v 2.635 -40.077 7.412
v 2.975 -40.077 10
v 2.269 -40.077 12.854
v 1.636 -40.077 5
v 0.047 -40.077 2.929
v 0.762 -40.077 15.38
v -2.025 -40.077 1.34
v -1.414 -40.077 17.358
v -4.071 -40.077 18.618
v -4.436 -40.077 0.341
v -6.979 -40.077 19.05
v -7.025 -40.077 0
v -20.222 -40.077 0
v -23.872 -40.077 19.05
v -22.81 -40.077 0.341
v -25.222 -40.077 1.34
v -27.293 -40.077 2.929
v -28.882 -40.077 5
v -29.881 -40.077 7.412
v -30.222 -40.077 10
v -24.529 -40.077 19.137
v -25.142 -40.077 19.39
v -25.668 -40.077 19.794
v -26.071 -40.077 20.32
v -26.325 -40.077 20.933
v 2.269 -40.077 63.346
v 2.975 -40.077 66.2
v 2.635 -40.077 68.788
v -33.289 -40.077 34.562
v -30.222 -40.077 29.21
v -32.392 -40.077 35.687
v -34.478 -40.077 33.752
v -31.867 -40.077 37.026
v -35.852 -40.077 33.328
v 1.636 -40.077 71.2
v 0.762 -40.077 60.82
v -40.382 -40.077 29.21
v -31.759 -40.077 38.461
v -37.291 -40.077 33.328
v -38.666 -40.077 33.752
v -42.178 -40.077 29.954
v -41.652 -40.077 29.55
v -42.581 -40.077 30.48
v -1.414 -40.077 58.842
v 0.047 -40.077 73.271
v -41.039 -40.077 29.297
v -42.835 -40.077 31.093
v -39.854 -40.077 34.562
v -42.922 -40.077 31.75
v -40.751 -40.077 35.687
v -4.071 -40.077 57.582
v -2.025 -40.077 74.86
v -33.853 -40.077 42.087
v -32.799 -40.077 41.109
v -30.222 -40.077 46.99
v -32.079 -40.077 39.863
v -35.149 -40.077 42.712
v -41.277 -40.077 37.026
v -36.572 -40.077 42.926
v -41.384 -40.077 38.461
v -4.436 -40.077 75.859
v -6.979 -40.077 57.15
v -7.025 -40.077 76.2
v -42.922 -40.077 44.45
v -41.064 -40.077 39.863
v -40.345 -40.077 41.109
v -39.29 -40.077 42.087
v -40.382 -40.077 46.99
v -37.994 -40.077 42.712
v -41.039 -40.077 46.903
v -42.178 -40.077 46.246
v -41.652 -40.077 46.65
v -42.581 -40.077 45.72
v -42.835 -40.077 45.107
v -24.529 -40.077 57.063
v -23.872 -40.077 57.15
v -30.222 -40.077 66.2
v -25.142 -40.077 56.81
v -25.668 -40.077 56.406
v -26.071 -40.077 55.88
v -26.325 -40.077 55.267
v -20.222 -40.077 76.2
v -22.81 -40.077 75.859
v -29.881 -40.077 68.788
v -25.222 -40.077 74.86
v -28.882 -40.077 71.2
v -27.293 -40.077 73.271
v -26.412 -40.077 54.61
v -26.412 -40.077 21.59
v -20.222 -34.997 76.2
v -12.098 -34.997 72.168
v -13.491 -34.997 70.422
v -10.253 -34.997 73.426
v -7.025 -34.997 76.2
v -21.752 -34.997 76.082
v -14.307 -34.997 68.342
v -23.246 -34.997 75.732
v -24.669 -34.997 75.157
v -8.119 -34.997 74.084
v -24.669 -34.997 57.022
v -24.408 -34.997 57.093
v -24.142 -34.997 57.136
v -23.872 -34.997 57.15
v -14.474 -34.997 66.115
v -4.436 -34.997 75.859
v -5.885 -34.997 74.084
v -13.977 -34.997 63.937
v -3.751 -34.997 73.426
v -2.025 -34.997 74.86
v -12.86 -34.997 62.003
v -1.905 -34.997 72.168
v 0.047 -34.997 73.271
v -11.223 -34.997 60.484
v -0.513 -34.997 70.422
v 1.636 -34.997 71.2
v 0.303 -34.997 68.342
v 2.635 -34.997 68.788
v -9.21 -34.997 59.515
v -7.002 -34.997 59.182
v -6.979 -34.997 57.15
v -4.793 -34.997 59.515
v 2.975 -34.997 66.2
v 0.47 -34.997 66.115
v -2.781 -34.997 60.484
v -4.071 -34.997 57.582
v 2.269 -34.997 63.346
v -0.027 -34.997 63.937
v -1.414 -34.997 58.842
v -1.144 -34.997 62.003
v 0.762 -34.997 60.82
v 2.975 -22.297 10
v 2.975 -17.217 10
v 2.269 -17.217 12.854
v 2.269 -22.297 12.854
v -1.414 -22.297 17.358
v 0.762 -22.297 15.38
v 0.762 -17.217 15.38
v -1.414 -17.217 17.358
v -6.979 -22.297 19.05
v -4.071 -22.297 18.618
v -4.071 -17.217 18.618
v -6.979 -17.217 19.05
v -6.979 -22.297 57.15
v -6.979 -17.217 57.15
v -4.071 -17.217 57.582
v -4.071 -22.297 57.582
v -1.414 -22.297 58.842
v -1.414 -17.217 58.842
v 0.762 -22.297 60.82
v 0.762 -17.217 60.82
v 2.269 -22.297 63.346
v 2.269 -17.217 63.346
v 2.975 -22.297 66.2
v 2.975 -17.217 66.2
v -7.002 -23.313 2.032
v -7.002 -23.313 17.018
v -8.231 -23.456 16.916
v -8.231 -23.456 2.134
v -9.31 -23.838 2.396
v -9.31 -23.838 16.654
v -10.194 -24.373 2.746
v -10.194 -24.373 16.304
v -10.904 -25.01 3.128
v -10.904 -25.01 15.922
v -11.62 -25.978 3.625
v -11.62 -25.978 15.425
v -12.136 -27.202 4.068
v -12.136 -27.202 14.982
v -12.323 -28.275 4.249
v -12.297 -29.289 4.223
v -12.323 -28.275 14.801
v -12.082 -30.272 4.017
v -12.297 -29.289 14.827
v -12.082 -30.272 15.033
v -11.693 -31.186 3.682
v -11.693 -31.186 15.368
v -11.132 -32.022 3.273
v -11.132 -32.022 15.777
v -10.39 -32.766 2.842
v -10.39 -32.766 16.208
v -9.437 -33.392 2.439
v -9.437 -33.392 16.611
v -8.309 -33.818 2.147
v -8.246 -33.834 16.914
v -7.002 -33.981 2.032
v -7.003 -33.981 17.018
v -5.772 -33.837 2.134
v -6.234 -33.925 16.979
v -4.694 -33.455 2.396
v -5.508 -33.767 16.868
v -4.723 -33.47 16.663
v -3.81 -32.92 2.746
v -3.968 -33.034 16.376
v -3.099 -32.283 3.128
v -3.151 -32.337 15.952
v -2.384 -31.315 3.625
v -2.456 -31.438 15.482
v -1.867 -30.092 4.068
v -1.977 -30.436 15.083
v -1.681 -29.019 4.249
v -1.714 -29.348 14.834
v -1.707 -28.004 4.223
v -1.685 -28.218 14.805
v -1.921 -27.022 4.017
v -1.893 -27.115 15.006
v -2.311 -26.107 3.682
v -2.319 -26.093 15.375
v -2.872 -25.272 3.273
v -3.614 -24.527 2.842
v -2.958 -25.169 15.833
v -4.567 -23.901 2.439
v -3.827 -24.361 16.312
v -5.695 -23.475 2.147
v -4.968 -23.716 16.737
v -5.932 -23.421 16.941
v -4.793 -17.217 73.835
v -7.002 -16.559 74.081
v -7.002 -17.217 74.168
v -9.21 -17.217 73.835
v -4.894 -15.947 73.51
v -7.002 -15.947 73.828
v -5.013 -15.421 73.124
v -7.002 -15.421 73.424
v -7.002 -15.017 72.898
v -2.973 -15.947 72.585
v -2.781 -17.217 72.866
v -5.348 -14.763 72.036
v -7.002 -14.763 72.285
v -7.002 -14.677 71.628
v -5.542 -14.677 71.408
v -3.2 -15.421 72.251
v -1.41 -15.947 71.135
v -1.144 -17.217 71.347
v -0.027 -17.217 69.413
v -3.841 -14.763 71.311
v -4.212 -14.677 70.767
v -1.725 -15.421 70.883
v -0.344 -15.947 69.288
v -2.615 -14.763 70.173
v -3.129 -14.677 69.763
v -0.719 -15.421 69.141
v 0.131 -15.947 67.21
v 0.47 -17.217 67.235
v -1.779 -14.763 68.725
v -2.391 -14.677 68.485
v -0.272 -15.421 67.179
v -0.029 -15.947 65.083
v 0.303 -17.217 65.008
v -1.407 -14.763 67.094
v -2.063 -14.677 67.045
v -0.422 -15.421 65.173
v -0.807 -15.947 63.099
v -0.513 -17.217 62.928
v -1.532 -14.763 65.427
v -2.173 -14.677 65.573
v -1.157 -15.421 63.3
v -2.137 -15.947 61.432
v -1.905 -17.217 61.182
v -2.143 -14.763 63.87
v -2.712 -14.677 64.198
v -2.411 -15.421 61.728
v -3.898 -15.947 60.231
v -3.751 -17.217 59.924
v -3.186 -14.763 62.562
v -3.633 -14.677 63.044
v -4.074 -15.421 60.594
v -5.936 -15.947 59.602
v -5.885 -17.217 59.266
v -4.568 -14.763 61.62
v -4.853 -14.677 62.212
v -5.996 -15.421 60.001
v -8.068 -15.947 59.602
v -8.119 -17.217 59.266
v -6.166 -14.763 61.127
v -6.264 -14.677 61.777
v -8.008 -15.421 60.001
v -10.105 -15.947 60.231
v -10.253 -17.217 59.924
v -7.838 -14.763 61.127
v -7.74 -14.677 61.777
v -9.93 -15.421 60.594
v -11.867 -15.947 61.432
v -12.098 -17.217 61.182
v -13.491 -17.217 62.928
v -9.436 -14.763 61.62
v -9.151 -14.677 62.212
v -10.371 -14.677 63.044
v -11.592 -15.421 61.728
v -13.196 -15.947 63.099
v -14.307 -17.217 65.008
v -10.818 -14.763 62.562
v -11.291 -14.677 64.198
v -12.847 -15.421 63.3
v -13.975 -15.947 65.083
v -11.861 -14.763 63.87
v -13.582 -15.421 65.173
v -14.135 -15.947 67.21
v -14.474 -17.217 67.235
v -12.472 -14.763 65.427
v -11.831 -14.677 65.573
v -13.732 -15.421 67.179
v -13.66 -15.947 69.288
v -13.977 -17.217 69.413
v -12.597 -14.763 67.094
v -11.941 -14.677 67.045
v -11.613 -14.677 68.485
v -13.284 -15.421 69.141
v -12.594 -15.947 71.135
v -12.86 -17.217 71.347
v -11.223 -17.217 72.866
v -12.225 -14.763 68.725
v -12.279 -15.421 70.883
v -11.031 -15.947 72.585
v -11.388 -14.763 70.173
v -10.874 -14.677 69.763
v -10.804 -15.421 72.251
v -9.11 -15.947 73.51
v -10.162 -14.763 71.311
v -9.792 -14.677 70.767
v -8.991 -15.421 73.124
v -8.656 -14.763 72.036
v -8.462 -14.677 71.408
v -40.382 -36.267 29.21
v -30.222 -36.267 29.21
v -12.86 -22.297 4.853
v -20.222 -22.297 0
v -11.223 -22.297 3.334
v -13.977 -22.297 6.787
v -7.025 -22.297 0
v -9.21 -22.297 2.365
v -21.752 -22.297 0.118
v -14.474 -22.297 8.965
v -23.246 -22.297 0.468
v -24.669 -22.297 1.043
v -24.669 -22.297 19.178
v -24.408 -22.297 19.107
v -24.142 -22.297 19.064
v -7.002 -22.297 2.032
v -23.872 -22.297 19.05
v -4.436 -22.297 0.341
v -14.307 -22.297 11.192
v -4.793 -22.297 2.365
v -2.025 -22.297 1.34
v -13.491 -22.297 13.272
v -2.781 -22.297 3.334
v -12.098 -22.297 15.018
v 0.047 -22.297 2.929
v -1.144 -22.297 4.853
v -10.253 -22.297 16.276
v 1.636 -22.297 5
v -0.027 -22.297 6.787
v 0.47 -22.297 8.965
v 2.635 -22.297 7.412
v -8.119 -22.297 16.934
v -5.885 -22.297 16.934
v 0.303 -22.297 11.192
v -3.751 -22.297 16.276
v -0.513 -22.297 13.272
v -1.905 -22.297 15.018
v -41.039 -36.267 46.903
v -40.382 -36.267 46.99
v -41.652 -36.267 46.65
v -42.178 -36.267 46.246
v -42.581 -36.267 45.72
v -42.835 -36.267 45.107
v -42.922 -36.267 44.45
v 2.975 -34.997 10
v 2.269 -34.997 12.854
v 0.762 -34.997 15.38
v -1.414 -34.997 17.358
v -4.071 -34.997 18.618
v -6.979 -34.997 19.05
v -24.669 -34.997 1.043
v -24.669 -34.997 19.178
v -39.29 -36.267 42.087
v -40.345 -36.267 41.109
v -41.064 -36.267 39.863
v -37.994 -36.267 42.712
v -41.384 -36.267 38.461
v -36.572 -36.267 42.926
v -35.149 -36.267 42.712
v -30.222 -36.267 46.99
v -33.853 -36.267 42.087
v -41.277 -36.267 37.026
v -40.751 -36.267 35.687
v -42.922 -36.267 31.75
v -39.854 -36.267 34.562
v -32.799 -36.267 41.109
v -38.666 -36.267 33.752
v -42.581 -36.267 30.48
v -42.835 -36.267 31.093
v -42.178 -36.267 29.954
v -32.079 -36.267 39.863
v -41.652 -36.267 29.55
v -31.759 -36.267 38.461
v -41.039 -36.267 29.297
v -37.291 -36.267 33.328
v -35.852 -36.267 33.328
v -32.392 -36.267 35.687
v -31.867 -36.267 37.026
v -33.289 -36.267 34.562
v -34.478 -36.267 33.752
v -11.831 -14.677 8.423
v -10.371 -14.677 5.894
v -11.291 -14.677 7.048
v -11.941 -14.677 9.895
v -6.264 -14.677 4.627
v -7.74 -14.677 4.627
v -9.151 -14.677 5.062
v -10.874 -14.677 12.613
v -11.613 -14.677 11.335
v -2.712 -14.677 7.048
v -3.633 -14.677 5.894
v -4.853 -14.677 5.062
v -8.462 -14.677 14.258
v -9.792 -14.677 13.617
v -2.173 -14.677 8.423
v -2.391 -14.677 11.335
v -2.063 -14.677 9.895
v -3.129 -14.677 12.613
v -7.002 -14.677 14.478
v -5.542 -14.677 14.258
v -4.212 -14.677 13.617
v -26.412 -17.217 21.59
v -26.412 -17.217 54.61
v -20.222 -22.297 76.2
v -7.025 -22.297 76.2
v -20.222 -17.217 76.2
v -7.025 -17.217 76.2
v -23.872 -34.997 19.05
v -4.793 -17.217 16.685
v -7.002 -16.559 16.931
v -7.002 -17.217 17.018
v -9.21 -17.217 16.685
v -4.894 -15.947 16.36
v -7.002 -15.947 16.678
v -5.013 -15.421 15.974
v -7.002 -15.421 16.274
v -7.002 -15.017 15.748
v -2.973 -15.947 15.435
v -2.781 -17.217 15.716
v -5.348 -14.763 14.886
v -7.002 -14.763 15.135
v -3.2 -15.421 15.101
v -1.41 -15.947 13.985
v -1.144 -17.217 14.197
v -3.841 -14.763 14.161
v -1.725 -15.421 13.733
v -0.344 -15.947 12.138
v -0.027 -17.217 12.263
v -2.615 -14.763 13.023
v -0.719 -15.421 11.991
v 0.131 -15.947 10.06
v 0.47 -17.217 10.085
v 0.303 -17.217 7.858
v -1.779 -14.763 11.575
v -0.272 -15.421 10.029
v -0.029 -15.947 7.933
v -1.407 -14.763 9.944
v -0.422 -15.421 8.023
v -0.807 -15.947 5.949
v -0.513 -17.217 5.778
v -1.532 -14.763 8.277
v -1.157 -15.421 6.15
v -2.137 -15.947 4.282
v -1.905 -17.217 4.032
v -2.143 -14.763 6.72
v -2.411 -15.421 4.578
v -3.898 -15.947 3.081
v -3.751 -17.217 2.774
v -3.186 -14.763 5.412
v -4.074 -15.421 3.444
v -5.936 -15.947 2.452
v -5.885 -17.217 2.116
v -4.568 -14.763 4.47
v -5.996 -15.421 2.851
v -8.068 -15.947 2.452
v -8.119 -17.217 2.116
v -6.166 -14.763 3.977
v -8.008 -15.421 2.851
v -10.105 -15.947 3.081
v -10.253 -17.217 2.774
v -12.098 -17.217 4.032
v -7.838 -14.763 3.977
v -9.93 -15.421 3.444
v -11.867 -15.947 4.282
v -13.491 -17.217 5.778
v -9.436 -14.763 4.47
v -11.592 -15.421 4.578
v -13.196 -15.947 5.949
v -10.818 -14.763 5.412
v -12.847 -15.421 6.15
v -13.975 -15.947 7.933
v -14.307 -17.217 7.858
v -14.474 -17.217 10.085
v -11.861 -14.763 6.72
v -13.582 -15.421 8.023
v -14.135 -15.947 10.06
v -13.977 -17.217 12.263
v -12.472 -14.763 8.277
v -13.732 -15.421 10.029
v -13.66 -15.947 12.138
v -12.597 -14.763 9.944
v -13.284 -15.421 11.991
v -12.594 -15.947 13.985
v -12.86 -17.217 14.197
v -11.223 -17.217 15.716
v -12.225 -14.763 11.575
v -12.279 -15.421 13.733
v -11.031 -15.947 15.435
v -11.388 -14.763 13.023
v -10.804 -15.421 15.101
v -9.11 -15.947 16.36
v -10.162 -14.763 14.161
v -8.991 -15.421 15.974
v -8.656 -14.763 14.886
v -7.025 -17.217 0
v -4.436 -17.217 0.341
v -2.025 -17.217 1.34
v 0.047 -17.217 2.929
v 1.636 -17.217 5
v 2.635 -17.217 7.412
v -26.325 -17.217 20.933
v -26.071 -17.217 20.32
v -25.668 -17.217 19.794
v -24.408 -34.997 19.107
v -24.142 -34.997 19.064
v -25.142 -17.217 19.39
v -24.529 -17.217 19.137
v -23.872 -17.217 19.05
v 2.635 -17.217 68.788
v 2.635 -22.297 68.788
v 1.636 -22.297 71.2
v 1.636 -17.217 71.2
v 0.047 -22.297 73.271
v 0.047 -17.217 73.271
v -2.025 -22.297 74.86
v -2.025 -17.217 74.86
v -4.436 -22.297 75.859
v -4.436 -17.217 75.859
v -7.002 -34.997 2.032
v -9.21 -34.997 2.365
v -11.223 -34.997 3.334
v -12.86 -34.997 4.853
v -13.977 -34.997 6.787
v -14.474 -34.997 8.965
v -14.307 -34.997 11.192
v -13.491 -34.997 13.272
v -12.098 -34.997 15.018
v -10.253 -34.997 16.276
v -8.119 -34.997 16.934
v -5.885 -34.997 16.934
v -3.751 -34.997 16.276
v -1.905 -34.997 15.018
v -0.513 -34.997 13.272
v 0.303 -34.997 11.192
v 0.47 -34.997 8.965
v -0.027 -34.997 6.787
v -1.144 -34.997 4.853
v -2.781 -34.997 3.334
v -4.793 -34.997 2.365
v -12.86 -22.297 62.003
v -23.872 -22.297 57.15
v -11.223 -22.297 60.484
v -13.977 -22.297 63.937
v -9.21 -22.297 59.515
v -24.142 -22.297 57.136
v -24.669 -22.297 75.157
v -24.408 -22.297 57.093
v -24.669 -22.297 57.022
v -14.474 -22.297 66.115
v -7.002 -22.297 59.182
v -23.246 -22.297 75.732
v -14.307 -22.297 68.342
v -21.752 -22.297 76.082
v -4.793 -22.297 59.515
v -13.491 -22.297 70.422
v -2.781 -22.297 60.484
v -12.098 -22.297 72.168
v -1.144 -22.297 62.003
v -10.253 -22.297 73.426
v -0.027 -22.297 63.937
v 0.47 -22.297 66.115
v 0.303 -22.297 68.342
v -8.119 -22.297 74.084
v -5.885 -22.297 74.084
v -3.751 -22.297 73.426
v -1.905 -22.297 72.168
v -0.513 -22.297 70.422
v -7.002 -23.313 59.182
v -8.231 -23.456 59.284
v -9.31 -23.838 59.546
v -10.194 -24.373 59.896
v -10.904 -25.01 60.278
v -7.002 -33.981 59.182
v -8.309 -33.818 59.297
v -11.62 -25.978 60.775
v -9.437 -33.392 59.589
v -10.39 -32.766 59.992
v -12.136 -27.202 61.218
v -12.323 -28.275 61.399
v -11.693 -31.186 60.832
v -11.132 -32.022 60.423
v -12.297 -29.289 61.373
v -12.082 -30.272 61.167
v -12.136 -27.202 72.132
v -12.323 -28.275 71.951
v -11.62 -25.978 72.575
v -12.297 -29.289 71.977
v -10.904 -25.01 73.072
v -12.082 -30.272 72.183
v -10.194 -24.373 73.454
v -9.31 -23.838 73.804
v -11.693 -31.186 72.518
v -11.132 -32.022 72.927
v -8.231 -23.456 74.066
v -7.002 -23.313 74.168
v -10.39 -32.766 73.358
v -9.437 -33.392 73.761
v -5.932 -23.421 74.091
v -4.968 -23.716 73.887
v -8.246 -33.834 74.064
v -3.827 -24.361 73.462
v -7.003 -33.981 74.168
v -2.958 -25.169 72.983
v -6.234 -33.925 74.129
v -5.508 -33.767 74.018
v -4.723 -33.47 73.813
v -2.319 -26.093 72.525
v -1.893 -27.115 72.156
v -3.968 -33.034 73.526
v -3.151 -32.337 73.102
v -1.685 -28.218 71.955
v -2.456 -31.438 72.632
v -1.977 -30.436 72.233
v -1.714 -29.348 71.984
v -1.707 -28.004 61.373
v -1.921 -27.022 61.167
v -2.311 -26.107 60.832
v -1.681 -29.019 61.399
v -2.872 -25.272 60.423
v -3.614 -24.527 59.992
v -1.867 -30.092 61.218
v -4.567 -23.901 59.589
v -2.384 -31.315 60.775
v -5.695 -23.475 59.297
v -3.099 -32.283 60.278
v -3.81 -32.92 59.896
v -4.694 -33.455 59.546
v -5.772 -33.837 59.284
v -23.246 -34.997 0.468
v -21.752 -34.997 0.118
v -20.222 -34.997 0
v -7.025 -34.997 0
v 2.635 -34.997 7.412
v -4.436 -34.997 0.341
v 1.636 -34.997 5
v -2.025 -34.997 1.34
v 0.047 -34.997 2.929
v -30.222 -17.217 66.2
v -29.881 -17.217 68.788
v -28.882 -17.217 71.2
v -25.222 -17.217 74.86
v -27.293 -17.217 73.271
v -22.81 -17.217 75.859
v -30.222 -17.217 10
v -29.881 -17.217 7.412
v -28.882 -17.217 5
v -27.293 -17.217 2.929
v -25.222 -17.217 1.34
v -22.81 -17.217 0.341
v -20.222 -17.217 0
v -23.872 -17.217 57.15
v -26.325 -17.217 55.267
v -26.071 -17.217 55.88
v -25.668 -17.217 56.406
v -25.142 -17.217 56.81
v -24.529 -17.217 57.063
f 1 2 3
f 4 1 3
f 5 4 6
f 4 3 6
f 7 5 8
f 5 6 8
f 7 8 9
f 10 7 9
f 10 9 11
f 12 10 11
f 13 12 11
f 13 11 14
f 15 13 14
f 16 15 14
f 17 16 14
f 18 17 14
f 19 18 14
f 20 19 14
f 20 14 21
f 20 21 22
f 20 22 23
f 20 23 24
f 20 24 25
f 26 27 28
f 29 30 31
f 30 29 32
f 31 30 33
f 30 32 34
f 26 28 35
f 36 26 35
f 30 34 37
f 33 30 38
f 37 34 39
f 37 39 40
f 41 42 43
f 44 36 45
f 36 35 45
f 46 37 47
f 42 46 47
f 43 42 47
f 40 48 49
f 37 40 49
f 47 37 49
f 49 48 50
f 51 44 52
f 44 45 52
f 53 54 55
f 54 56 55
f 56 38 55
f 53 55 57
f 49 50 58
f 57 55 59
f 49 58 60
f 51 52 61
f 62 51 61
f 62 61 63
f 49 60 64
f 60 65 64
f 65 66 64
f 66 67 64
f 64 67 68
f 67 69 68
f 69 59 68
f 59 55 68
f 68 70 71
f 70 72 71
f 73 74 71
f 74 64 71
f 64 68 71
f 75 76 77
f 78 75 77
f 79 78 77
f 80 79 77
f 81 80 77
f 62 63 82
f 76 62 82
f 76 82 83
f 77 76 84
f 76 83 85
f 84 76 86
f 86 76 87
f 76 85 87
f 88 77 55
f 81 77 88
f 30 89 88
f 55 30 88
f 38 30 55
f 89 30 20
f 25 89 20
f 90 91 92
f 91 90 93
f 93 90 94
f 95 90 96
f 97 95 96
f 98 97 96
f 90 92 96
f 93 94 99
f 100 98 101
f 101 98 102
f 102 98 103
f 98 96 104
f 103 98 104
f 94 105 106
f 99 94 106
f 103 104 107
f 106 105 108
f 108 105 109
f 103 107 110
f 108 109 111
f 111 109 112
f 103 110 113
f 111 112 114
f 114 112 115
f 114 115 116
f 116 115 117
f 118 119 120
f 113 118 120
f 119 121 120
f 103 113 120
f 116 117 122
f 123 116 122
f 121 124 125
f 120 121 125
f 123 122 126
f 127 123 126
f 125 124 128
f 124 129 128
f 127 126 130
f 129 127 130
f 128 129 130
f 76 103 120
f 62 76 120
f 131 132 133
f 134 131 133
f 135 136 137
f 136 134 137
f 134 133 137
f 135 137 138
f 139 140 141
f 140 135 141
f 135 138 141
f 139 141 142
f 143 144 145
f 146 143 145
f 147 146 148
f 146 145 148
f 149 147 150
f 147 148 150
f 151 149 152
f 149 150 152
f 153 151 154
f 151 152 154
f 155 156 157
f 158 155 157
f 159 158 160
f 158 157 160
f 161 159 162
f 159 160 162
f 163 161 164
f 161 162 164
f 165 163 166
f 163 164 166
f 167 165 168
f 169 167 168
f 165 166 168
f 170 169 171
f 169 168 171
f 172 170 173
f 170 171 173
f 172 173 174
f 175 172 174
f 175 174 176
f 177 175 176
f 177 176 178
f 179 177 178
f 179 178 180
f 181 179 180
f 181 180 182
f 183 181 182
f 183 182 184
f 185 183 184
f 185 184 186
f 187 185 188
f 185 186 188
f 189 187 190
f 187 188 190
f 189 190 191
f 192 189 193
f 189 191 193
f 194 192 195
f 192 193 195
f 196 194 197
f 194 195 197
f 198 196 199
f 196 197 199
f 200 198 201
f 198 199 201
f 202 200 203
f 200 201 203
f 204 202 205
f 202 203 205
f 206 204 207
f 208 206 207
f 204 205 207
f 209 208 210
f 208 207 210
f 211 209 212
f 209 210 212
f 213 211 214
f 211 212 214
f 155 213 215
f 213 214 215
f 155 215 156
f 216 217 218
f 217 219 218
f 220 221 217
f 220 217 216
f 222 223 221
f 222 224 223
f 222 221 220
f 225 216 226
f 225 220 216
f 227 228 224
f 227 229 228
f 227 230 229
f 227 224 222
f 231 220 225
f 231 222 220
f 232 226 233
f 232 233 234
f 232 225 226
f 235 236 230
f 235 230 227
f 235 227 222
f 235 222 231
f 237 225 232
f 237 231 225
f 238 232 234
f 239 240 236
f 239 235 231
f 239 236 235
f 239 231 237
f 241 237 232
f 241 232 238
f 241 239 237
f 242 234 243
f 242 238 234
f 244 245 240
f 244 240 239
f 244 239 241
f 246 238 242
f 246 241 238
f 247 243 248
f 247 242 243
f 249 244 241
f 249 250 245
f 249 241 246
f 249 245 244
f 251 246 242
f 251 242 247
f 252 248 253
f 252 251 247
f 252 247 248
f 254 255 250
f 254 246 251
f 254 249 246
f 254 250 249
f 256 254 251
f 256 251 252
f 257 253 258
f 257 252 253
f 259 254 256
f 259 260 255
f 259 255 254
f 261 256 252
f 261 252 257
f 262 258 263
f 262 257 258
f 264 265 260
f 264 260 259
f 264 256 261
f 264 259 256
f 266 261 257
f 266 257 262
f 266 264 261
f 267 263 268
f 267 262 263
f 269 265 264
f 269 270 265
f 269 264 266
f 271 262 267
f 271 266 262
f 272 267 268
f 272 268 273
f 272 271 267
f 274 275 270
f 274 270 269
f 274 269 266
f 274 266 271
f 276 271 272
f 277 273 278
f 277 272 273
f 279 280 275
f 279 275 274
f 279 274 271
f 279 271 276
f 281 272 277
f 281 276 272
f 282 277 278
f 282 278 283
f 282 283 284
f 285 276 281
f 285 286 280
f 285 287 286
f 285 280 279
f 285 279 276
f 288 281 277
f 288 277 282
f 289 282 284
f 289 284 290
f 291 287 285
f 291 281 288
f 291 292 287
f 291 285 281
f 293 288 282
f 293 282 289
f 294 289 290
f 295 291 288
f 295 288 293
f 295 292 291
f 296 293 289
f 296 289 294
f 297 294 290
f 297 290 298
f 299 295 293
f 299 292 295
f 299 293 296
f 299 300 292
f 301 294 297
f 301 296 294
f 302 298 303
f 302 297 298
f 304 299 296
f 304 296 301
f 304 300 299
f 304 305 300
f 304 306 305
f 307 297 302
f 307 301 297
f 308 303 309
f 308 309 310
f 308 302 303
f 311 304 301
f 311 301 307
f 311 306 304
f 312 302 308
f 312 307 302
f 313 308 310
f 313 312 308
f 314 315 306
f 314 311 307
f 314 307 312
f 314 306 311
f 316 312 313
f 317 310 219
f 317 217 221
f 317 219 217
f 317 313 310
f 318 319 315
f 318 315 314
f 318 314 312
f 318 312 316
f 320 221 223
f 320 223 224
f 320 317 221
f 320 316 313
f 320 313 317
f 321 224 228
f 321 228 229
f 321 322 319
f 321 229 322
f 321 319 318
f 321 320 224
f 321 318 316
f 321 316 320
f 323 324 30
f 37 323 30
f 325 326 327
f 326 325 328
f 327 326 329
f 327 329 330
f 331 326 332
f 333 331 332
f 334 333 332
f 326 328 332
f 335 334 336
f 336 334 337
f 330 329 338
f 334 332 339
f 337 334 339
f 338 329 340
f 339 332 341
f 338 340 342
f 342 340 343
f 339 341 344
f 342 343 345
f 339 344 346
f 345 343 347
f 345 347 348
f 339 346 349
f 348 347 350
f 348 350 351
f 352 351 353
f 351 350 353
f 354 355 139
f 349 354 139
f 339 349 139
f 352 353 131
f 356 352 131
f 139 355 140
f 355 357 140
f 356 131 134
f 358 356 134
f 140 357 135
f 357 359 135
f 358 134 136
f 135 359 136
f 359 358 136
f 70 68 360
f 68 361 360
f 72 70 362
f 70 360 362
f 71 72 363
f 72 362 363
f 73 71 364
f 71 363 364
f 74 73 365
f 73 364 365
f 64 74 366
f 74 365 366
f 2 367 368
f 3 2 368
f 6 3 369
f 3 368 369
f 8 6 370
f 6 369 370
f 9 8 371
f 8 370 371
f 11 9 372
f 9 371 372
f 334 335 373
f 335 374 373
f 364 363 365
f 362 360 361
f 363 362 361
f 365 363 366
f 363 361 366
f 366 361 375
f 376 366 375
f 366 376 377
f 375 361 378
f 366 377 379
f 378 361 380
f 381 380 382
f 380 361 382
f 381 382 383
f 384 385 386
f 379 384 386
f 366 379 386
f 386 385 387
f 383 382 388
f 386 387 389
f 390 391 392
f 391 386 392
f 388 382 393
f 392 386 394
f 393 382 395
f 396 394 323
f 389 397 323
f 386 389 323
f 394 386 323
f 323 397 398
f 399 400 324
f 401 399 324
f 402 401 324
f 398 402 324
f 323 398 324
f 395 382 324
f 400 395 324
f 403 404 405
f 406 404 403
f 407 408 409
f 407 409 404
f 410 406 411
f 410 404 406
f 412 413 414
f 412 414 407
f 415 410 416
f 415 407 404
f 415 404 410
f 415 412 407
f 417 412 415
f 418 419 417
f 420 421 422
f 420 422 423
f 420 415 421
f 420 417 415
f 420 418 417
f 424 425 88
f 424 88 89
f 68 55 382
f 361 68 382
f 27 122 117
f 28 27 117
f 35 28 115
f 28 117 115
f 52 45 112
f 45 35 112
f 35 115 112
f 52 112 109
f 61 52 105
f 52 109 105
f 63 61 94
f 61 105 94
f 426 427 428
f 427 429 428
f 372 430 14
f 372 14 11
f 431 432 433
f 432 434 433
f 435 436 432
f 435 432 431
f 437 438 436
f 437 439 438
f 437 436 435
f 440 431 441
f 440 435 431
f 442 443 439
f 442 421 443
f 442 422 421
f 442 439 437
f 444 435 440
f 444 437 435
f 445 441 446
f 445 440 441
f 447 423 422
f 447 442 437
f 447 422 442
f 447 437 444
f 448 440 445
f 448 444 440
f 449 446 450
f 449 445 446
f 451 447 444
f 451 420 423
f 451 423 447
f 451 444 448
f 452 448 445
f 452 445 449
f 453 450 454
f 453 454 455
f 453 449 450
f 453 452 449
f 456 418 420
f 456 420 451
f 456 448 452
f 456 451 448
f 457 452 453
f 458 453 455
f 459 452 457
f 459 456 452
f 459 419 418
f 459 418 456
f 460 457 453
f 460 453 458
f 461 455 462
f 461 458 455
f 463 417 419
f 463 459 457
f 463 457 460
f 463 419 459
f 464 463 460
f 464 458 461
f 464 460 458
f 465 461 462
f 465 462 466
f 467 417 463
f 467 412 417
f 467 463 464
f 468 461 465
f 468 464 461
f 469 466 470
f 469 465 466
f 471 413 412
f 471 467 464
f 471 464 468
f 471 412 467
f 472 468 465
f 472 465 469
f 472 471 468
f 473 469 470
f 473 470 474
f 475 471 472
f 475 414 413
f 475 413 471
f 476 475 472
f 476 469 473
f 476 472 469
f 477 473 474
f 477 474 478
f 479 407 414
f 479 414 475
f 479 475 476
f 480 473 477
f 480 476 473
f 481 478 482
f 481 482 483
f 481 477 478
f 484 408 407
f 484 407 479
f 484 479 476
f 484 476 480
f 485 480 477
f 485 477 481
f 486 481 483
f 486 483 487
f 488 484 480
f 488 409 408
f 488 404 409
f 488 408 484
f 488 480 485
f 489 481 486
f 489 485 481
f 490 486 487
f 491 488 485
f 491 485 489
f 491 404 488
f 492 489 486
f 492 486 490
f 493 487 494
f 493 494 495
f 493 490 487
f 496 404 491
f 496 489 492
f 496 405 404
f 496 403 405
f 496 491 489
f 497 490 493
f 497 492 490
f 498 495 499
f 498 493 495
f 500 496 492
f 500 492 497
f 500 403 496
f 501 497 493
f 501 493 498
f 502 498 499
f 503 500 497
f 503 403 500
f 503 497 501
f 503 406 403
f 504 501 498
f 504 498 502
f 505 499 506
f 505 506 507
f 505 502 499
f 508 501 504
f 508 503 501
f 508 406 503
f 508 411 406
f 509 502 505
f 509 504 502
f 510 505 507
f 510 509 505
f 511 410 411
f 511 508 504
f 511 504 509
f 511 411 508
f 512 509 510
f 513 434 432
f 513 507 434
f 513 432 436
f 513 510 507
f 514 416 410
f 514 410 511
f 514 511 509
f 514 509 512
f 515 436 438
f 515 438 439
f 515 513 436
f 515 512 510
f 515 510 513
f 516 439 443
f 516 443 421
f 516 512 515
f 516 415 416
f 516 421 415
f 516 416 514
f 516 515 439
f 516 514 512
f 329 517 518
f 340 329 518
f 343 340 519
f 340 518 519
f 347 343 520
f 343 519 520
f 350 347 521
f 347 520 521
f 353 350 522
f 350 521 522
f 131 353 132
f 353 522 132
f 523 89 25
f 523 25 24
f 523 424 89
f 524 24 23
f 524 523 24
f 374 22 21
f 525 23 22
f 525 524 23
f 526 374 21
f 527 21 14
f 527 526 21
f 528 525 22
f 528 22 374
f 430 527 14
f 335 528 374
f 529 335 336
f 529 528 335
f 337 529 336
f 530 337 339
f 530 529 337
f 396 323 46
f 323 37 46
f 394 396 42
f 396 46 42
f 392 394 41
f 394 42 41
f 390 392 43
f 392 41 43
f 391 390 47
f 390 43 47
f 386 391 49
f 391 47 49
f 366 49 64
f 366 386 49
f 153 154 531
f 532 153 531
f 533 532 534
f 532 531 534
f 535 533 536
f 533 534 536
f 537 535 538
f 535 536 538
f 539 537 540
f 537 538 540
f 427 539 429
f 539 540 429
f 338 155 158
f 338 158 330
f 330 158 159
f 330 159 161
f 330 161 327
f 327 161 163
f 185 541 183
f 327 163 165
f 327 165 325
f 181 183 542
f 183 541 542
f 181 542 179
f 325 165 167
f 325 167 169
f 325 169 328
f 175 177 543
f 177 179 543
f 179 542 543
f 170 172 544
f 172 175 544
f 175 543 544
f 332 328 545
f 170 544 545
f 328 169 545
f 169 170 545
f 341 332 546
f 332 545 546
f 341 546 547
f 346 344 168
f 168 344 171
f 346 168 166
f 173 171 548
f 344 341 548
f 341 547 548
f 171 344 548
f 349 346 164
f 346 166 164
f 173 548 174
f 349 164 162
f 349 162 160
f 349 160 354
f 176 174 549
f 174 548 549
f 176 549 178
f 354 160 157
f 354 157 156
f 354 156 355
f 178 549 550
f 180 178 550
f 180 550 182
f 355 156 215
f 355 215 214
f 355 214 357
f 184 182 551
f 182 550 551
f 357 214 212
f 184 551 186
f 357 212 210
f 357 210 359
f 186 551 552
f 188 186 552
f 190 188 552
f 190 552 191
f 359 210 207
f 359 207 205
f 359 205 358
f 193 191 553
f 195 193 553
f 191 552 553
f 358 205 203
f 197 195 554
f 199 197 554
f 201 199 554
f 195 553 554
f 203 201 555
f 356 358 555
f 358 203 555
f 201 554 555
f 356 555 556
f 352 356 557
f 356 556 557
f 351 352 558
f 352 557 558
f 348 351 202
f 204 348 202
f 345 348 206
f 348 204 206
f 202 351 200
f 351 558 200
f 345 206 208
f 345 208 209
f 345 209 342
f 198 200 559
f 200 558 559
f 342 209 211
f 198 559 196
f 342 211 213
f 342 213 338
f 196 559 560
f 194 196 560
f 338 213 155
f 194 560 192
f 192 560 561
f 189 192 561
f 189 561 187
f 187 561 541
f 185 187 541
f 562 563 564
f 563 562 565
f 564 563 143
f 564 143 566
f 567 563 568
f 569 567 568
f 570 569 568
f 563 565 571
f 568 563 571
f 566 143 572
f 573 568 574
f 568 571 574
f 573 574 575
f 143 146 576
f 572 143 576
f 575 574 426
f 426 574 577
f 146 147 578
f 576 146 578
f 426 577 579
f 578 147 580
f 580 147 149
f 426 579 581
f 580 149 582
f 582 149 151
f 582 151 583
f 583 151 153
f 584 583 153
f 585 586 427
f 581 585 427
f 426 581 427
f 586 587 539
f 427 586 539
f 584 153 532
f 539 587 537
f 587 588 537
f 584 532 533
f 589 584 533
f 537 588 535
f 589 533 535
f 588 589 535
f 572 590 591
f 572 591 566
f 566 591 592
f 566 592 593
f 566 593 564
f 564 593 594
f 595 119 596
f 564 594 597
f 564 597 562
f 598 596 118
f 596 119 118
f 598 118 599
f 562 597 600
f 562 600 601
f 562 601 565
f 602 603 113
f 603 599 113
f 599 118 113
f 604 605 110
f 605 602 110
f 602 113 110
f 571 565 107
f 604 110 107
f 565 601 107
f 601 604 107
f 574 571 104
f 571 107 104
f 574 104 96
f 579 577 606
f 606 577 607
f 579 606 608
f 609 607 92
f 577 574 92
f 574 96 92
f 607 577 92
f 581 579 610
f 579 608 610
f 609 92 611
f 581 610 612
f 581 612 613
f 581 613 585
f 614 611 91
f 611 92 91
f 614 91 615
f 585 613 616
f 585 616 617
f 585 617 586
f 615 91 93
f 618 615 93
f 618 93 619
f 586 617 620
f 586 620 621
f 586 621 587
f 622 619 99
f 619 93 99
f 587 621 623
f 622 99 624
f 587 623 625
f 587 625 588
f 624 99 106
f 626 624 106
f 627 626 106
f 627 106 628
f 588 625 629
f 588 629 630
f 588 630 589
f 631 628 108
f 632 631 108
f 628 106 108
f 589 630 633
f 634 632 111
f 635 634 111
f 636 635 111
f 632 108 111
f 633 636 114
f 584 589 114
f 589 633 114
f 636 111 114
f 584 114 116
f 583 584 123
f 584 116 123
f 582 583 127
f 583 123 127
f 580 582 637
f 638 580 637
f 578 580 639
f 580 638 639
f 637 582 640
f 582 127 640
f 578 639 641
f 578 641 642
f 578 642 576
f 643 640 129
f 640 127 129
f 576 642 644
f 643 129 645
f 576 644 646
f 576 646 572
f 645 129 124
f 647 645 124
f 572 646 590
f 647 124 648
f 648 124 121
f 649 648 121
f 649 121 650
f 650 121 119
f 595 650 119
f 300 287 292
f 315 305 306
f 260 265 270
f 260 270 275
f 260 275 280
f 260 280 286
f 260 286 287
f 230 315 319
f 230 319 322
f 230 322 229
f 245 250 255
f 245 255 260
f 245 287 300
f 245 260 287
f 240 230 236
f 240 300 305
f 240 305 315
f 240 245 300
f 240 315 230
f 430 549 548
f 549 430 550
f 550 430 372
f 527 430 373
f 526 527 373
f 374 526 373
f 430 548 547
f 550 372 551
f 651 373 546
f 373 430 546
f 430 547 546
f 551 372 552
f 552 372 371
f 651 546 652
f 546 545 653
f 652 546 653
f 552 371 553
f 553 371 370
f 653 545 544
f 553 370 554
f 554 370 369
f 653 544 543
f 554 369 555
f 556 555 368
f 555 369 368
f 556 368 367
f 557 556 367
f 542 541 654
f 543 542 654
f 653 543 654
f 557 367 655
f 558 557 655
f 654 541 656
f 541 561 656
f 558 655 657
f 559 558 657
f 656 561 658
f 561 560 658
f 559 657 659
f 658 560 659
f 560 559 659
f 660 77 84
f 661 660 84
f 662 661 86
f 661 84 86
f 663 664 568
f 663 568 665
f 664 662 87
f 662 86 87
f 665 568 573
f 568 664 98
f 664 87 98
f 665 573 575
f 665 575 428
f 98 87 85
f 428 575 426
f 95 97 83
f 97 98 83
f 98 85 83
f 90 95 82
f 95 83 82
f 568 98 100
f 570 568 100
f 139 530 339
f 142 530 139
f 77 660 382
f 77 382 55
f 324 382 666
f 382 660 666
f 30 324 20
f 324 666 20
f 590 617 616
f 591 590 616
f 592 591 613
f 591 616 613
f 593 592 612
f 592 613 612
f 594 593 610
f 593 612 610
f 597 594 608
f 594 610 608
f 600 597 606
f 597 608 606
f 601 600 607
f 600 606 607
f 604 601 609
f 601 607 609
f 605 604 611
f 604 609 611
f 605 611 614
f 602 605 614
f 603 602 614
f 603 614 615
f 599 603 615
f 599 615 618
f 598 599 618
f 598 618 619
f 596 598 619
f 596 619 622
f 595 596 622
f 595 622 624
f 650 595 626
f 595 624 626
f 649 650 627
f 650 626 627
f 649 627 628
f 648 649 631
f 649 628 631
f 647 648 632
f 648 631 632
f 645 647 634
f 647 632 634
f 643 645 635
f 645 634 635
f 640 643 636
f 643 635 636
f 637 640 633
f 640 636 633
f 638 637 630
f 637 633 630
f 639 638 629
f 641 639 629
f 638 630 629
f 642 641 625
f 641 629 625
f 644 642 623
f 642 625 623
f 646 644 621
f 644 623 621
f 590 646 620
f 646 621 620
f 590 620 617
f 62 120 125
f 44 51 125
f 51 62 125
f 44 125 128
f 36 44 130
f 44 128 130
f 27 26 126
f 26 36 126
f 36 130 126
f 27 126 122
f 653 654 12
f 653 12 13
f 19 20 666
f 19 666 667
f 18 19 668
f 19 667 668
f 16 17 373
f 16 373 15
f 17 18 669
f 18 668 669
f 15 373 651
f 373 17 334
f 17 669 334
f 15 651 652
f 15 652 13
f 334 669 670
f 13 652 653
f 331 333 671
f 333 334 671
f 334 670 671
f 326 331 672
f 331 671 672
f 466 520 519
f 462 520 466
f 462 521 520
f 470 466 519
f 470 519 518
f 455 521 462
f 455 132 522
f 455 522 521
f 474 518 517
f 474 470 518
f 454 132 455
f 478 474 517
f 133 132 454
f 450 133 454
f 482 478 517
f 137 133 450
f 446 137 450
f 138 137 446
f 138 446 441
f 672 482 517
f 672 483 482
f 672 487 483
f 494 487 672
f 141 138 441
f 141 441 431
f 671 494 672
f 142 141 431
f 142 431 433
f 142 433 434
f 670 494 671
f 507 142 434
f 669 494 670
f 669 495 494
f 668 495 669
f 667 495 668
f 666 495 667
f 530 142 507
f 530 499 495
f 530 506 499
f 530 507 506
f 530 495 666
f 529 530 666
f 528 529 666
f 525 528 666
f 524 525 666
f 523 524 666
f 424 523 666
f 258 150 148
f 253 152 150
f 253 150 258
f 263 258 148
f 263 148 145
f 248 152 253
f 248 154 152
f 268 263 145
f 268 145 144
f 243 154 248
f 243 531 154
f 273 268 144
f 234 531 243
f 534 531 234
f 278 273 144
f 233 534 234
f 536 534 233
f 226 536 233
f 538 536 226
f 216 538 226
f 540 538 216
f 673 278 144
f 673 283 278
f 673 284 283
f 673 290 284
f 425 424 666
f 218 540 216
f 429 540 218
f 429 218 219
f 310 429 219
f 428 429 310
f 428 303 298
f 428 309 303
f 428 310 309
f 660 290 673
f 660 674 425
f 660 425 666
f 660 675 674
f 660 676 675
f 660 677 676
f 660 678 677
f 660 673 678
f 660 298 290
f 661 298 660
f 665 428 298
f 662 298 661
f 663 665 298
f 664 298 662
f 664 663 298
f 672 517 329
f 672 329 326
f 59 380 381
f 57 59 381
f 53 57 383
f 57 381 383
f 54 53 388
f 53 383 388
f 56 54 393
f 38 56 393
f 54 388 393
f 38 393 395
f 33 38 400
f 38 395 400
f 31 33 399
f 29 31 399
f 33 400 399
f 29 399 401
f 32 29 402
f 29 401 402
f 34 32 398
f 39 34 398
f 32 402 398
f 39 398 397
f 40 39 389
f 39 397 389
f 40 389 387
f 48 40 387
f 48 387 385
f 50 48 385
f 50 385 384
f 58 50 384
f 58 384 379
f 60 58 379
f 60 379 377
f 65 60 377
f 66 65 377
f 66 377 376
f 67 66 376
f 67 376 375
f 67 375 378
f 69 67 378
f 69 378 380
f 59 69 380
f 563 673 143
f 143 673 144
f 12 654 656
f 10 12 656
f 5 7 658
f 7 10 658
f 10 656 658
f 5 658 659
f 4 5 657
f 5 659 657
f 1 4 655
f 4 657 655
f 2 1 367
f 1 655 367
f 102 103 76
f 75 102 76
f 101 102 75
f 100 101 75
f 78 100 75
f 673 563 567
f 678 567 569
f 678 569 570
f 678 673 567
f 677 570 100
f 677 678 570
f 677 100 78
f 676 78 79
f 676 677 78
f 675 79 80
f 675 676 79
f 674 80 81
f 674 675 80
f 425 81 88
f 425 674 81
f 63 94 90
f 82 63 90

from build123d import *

# Parameters (mm, degrees)
BOSS_EXTRUDE4_DEPTH = 76.2
FILLET1_R           = 10
SKETCH8_W           = 29.387209302
SKETCH8_H           = 38.1
CUT_EXTRUDE2_DEPTH  = 25.4
FILLET2_R           = 10
SKETCH9_R           = 7.493
BOSS_EXTRUDE5_DEPTH = 2.54
FILLET4_R           = 2.54
BOSS_EXTRUDE6_REACH = 86.455
SKETCH10_R          = 7.493
SKETCH11_R          = 5.334
CUT_EXTRUDE3_DEPTH  = 76.2
FILLET5_R           = 2.54
BOSS_EXTRUDE7_DEPTH = 12.7
FILLET6_R           = 2.54
SKETCH13_R          = 4.826
CUT_EXTRUDE4_DEPTH  = 5.08


# Some blends are built 0.0001 mm under size
with BuildPart() as part:
    # Sketch7 → Boss-Extrude4 (new body)
    with BuildSketch(Plane.XY):
        Polygon((-30.221718637, -17.216733289), (2.975490665, -17.216733289), (2.975490665, -22.296733289), (-24.669160498, -22.296733289), (-24.669160498, -34.996733289), (2.975490665, -34.996733289), (2.975490665, -40.076733289), (-30.221718637, -40.076733289), (-30.221718637, -34.996733289), (-30.221718637, -22.296733289), align=None)
    extrude(amount=BOSS_EXTRUDE4_DEPTH)

    # Fillet1
    # the kernel refuses this fillet: 10 mm, written as the material it takes off along each edge
    with BuildSketch(Plane(origin=(-30.221718637, -65.076733289, 76.2), x_dir=(1, 0, 0), z_dir=(0, 1, 0)), Plane(origin=(-30.221718637, 7.783266711, 0), x_dir=(1, 0, 0), z_dir=(0, -1, 0))) as fillet1_piece_1:
        with BuildLine():
            CenterArc((FILLET1_R, FILLET1_R), FILLET1_R, 180, 90)
            Line((0, FILLET1_R), (0, 0))
            Line((0, 0), (FILLET1_R, 0))
        make_face()
    extrude(amount=72.86, mode=Mode.SUBTRACT)
    with BuildSketch(Plane(origin=(2.975490665, -9.996733289, 76.2), x_dir=(-1, 0, 0), z_dir=(0, -1, 0)), Plane(origin=(2.975490665, 7.783266711, 76.2), x_dir=(-1, 0, 0), z_dir=(0, -1, 0)), Plane(origin=(2.975490665, -9.996733289, 0), x_dir=(0, 0, 1), z_dir=(0, -1, 0))) as fillet1_piece_2:
        with BuildLine():
            CenterArc((FILLET1_R, FILLET1_R), FILLET1_R, 180, 90)
            Line((0, FILLET1_R), (0, 0))
            Line((0, 0), (FILLET1_R, 0))
        make_face()
    extrude(amount=55.08, mode=Mode.SUBTRACT)
    with BuildSketch(Plane(origin=(2.975490665, 7.783266711, 0), x_dir=(-1, 0, 0), z_dir=(0, -1, 0))) as fillet1_piece_3:
        with BuildLine():
            CenterArc((FILLET1_R, -FILLET1_R), FILLET1_R, 90, 90)
            Line((0, -FILLET1_R), (0, 0))
            Line((0, 0), (FILLET1_R, 0))
        make_face()
    extrude(amount=55.08, mode=Mode.SUBTRACT)

    # Sketch8 → Cut-Extrude2 (cut)
    with BuildSketch(Plane(origin=(0, -17.216733289, 0), x_dir=(1, 0, 0), z_dir=(0, 1, 0))):
        with Locations((-11.718113986, -38.1)):
            Rectangle(SKETCH8_W, SKETCH8_H)
    extrude(amount=-CUT_EXTRUDE2_DEPTH, mode=Mode.SUBTRACT)

    # Fillet2
    # the kernel refuses this fillet: 10 mm, written as the material it takes off along each edge
    with BuildSketch(Plane(origin=(2.975490665, -10.109801477, 57.15), x_dir=(-1, 0, 0), z_dir=(0, -1, 0)), Plane(origin=(2.975490665, 7.670198523, 57.15), x_dir=(-1, 0, 0), z_dir=(0, -1, 0))) as fillet2_piece_1:
        with BuildLine():
            CenterArc((9.954772725, -10), FILLET2_R, 90, 84.548680188)
            Line((0, -9.05), (-0.199095454, -9.031))
            ThreePointArc((-0.199095454, -9.031), (-0.2, -4.525), (-0.2, 0))
            Line((-0.2, 0), (0, 0.2))
            Line((0, 0.2), (9.954772725, 0.2))
            Line((9.954772725, 0.2), (9.954772725, 0))
        make_face()
    extrude(amount=54.853863623, mode=Mode.SUBTRACT)
    with BuildSketch(Plane(origin=(2.975490665, -10.109801477, 19.05), x_dir=(-1, 0, 0), z_dir=(0, -1, 0))) as fillet2_piece_2:
        with BuildLine():
            CenterArc((9.954772725, 10), FILLET2_R, 185.451319812, 84.548680188)
            Line((0, 9.05), (-0.199095454, 9.031))
            ThreePointArc((-0.199095454, 9.031), (-0.2, 4.525), (-0.2, 0))
            Line((-0.2, 0), (0, -0.2))
            Line((0, -0.2), (9.954772725, -0.2))
            Line((9.954772725, -0.2), (9.954772725, 0))
        make_face()
    extrude(amount=54.853863623, mode=Mode.SUBTRACT)
    with BuildSketch(Plane(origin=(2.975490665, 7.670198523, 19.05), x_dir=(0, 0, -1), z_dir=(0, -1, 0))) as fillet2_piece_3:
        with BuildLine():
            CenterArc((10, -9.954772725), FILLET2_R, 95.451319812, 84.548680188)
            Line((0, -9.954772725), (-0.2, -9.954772725))
            Line((-0.2, -9.954772725), (-0.2, 0))
            Line((-0.2, 0), (0, 0.2))
            ThreePointArc((0, 0.2), (4.525, 0.2), (9.031, 0.199095454))
            Line((9.031, 0.199095454), (9.05, 0))
        make_face()
    extrude(amount=54.853863623, mode=Mode.SUBTRACT)

    # Sketch9 → Boss-Extrude5 (add)
    with BuildSketch(Plane(origin=(0, -17.216733289, 0), x_dir=(1, 0, 0), z_dir=(0, 1, 0))):
        with Locations(Location((-7.001895697, -66.675, 0), (0, 0, 270))):
            Circle(SKETCH9_R)
        with Locations(Location((-7.001895697, -9.525, 0), (0, 0, 270))):
            Circle(SKETCH9_R)
    extrude(amount=BOSS_EXTRUDE5_DEPTH)

    # Fillet4
    fillet4_edges = [part.edges().sort_by_distance(p)[0] for p in [
        (-7.001895697, -14.676733289, 59.182),
        (-7.001895697, -14.676733289, 2.032),
    ]]
    fillet(fillet4_edges, radius=FILLET4_R - 0.0001)  # a hair under: the kernel refuses the full size

    # Sketch10 → Boss-Extrude6 (add, up to next)
    with BuildSketch(Plane(origin=(0, -34.996733289, 0), x_dir=(1, 0, 0), z_dir=(0, 1, 0)), mode=Mode.PRIVATE) as boss_extrude6_sk1:
        with Locations(Location((-7.001895697, -66.675, 0), (0, 0, 90))):
            Circle(SKETCH10_R)
    boss_extrude6_tool1 = extrude(boss_extrude6_sk1.sketch, amount=BOSS_EXTRUDE6_REACH, mode=Mode.PRIVATE) - part.part
    # Sketch10 → Boss-Extrude6 (add, up to next)
    with BuildSketch(Plane(origin=(0, -34.996733289, 0), x_dir=(1, 0, 0), z_dir=(0, 1, 0)), mode=Mode.PRIVATE) as boss_extrude6_sk2:
        with Locations(Location((-7.001895697, -9.525, 0), (0, 0, 90))):
            Circle(SKETCH10_R)
    boss_extrude6_tool2 = extrude(boss_extrude6_sk2.sketch, amount=BOSS_EXTRUDE6_REACH, mode=Mode.PRIVATE) - part.part
    add(boss_extrude6_tool1.solids().sort_by_distance((-7.001896, -34.996733, 66.675))[0])
    add(boss_extrude6_tool2.solids().sort_by_distance((-7.001896, -34.996733, 9.525))[0])

    # Sketch11 → Cut-Extrude3 (cut)
    with BuildSketch(Plane.XY.offset(76.2)):
        with Locations(Location((-7.001895697, -28.646733289, 0), (0, 0, 90.00000003))):
            Circle(SKETCH11_R)
    extrude(amount=-CUT_EXTRUDE3_DEPTH, mode=Mode.SUBTRACT)

    # Fillet5
    # the kernel refuses this fillet: 2.54 mm, written as the material it adds along each edge
    with BuildSketch(Plane(origin=(-26.411718637, -17.216733289, 57.15), x_dir=(0, 0, -1), z_dir=(0, -1, 0))) as fillet5_piece_1_section:
        with BuildLine():
            CenterArc((FILLET5_R, FILLET5_R), FILLET5_R, 180, 90)
            Line((0, FILLET5_R), (0, 0))
            Line((0, 0), (FILLET5_R, 0))
        make_face()
    fillet5_piece_1 = extrude(amount=22.86, mode=Mode.PRIVATE)
    fillet5_piece_1 = split(fillet5_piece_1, bisect_by=Plane(origin=(-24.669160498, -17.216733289, 57.15), z_dir=(-1, 0, 0)), keep=Keep.TOP, mode=Mode.PRIVATE)
    fillet5_piece_1 = split(fillet5_piece_1, bisect_by=Plane(origin=(-26.411718637, -22.296733289, 57.15), z_dir=(0, 1, 0)), keep=Keep.TOP, mode=Mode.PRIVATE)
    add(fillet5_piece_1)
    with BuildSketch(Plane(origin=(-26.411718637, -17.216733289, 57.15), x_dir=(0, 0, -1), z_dir=(0, -1, 0))) as fillet5_piece_2_section:
        with BuildLine():
            CenterArc((FILLET5_R, FILLET5_R), FILLET5_R, 180, 90)
            Line((0, FILLET5_R), (0, 0))
            Line((0, 0), (FILLET5_R, 0))
        make_face()
    fillet5_piece_2 = extrude(amount=22.86, mode=Mode.PRIVATE)
    fillet5_piece_2 = split(fillet5_piece_2, bisect_by=Plane(origin=(-24.669160498, -17.216733289, 57.15), z_dir=(1, 0, 0)), keep=Keep.TOP, mode=Mode.PRIVATE)
    fillet5_piece_2 = split(fillet5_piece_2, bisect_by=Plane(origin=(-26.411718637, -22.296733289, 57.15), z_dir=(0, 1, 0)), keep=Keep.TOP, mode=Mode.PRIVATE)
    add(fillet5_piece_2)
    with BuildSketch(Plane(origin=(-26.411718637, -17.216733289, 57.15), x_dir=(0, 0, -1), z_dir=(0, -1, 0))) as fillet5_piece_3_section:
        with BuildLine():
            CenterArc((FILLET5_R, FILLET5_R), FILLET5_R, 180, 90)
            Line((0, FILLET5_R), (0, 0))
            Line((0, 0), (FILLET5_R, 0))
        make_face()
    fillet5_piece_3 = extrude(amount=22.86, mode=Mode.PRIVATE)
    fillet5_piece_3 = split(fillet5_piece_3, bisect_by=Plane(origin=(-26.411718637, -34.996733289, 57.15), z_dir=(0, 1, 0)), keep=Keep.TOP, mode=Mode.PRIVATE)
    fillet5_piece_3 = split(fillet5_piece_3, bisect_by=Plane(origin=(-24.669160498, -17.216733289, 57.15), z_dir=(-1, 0, 0)), keep=Keep.TOP, mode=Mode.PRIVATE)
    fillet5_piece_3 = split(fillet5_piece_3, bisect_by=Plane(origin=(-26.411718637, -22.296733289, 57.15), z_dir=(0, -1, 0)), keep=Keep.TOP, mode=Mode.PRIVATE)
    add(fillet5_piece_3)
    with BuildSketch(Plane(origin=(-26.411718637, -17.216733289, 57.15), x_dir=(0, 0, -1), z_dir=(0, -1, 0))) as fillet5_piece_4_section:
        with BuildLine():
            CenterArc((FILLET5_R, FILLET5_R), FILLET5_R, 180, 90)
            Line((0, FILLET5_R), (0, 0))
            Line((0, 0), (FILLET5_R, 0))
        make_face()
    fillet5_piece_4 = extrude(amount=22.86, mode=Mode.PRIVATE)
    fillet5_piece_4 = split(fillet5_piece_4, bisect_by=Plane(origin=(-26.411718637, -34.996733289, 57.15), z_dir=(0, -1, 0)), keep=Keep.TOP, mode=Mode.PRIVATE)
    fillet5_piece_4 = split(fillet5_piece_4, bisect_by=Plane(origin=(-24.669160498, -17.216733289, 57.15), z_dir=(-1, 0, 0)), keep=Keep.TOP, mode=Mode.PRIVATE)
    add(fillet5_piece_4)
    with BuildSketch(Plane(origin=(-26.411718637, -17.216733289, 57.15), x_dir=(0, 0, -1), z_dir=(0, -1, 0))) as fillet5_piece_5_section:
        with BuildLine():
            CenterArc((FILLET5_R, FILLET5_R), FILLET5_R, 180, 90)
            Line((0, FILLET5_R), (0, 0))
            Line((0, 0), (FILLET5_R, 0))
        make_face()
    fillet5_piece_5 = extrude(amount=22.86, mode=Mode.PRIVATE)
    fillet5_piece_5 = split(fillet5_piece_5, bisect_by=Plane(origin=(-26.411718637, -34.996733289, 57.15), z_dir=(0, -1, 0)), keep=Keep.TOP, mode=Mode.PRIVATE)
    fillet5_piece_5 = split(fillet5_piece_5, bisect_by=Plane(origin=(-24.669160498, -17.216733289, 57.15), z_dir=(1, 0, 0)), keep=Keep.TOP, mode=Mode.PRIVATE)
    add(fillet5_piece_5)
    with BuildSketch(Plane(origin=(-26.411718637, -17.216733289, 19.05), x_dir=(1, 0, 0), z_dir=(0, -1, 0))) as fillet5_piece_6_section:
        with BuildLine():
            CenterArc((FILLET5_R, FILLET5_R), FILLET5_R, 180, 90)
            Line((0, FILLET5_R), (0, 0))
            Line((0, 0), (FILLET5_R, 0))
        make_face()
    fillet5_piece_6 = extrude(amount=22.86, mode=Mode.PRIVATE)
    fillet5_piece_6 = split(fillet5_piece_6, bisect_by=Plane(origin=(-26.411718637, -22.296733289, 19.05), z_dir=(0, 1, 0)), keep=Keep.TOP, mode=Mode.PRIVATE)
    fillet5_piece_6 = split(fillet5_piece_6, bisect_by=Plane(origin=(-24.669160498, -17.216733289, 19.05), z_dir=(1, 0, 0)), keep=Keep.TOP, mode=Mode.PRIVATE)
    add(fillet5_piece_6)
    with BuildSketch(Plane(origin=(-26.411718637, -17.216733289, 19.05), x_dir=(1, 0, 0), z_dir=(0, -1, 0))) as fillet5_piece_7_section:
        with BuildLine():
            CenterArc((FILLET5_R, FILLET5_R), FILLET5_R, 180, 90)
            Line((0, FILLET5_R), (0, 0))
            Line((0, 0), (FILLET5_R, 0))
        make_face()
    fillet5_piece_7 = extrude(amount=22.86, mode=Mode.PRIVATE)
    fillet5_piece_7 = split(fillet5_piece_7, bisect_by=Plane(origin=(-26.411718637, -22.296733289, 19.05), z_dir=(0, 1, 0)), keep=Keep.TOP, mode=Mode.PRIVATE)
    fillet5_piece_7 = split(fillet5_piece_7, bisect_by=Plane(origin=(-24.669160498, -17.216733289, 19.05), z_dir=(-1, 0, 0)), keep=Keep.TOP, mode=Mode.PRIVATE)
    add(fillet5_piece_7)
    with BuildSketch(Plane(origin=(-26.411718637, -17.216733289, 19.05), x_dir=(1, 0, 0), z_dir=(0, -1, 0))) as fillet5_piece_8_section:
        with BuildLine():
            CenterArc((FILLET5_R, FILLET5_R), FILLET5_R, 180, 90)
            Line((0, FILLET5_R), (0, 0))
            Line((0, 0), (FILLET5_R, 0))
        make_face()
    fillet5_piece_8 = extrude(amount=22.86, mode=Mode.PRIVATE)
    fillet5_piece_8 = split(fillet5_piece_8, bisect_by=Plane(origin=(-26.411718637, -22.296733289, 19.05), z_dir=(0, -1, 0)), keep=Keep.TOP, mode=Mode.PRIVATE)
    fillet5_piece_8 = split(fillet5_piece_8, bisect_by=Plane(origin=(-24.669160498, -17.216733289, 19.05), z_dir=(-1, 0, 0)), keep=Keep.TOP, mode=Mode.PRIVATE)
    fillet5_piece_8 = split(fillet5_piece_8, bisect_by=Plane(origin=(-26.411718637, -34.996733289, 19.05), z_dir=(0, 1, 0)), keep=Keep.TOP, mode=Mode.PRIVATE)
    add(fillet5_piece_8)
    with BuildSketch(Plane(origin=(-26.411718637, -17.216733289, 19.05), x_dir=(1, 0, 0), z_dir=(0, -1, 0))) as fillet5_piece_9_section:
        with BuildLine():
            CenterArc((FILLET5_R, FILLET5_R), FILLET5_R, 180, 90)
            Line((0, FILLET5_R), (0, 0))
            Line((0, 0), (FILLET5_R, 0))
        make_face()
    fillet5_piece_9 = extrude(amount=22.86, mode=Mode.PRIVATE)
    fillet5_piece_9 = split(fillet5_piece_9, bisect_by=Plane(origin=(-24.669160498, -17.216733289, 19.05), z_dir=(1, 0, 0)), keep=Keep.TOP, mode=Mode.PRIVATE)
    fillet5_piece_9 = split(fillet5_piece_9, bisect_by=Plane(origin=(-26.411718637, -34.996733289, 19.05), z_dir=(0, -1, 0)), keep=Keep.TOP, mode=Mode.PRIVATE)
    add(fillet5_piece_9)
    with BuildSketch(Plane(origin=(-26.411718637, -17.216733289, 19.05), x_dir=(1, 0, 0), z_dir=(0, -1, 0))) as fillet5_piece_10_section:
        with BuildLine():
            CenterArc((FILLET5_R, FILLET5_R), FILLET5_R, 180, 90)
            Line((0, FILLET5_R), (0, 0))
            Line((0, 0), (FILLET5_R, 0))
        make_face()
    fillet5_piece_10 = extrude(amount=22.86, mode=Mode.PRIVATE)
    fillet5_piece_10 = split(fillet5_piece_10, bisect_by=Plane(origin=(-24.669160498, -17.216733289, 19.05), z_dir=(-1, 0, 0)), keep=Keep.TOP, mode=Mode.PRIVATE)
    fillet5_piece_10 = split(fillet5_piece_10, bisect_by=Plane(origin=(-26.411718637, -34.996733289, 19.05), z_dir=(0, -1, 0)), keep=Keep.TOP, mode=Mode.PRIVATE)
    add(fillet5_piece_10)

    # Sketch12 → Boss-Extrude7 (add)
    with BuildSketch(Plane.ZY.offset(30.221718637)):
        Polygon((29.21, -40.076733289), (38.1, -40.076733289), (46.99, -40.076733289), (46.99, -36.266733289), (38.1, -36.266733289), (29.21, -36.266733289), align=None)
    extrude(amount=BOSS_EXTRUDE7_DEPTH)

    # Fillet6
    fillet6_edges = [part.edges().sort_by_distance(p)[0] for p in [
        (-42.921718637, -38.171733289, 46.99),
        (-42.921718637, -38.171733289, 29.21),
    ]]
    fillet(fillet6_edges, radius=FILLET6_R)

    # Sketch13 → Cut-Extrude4 (cut)
    with BuildSketch(Plane(origin=(0, -36.266733289, 0), x_dir=(1, 0, 0), z_dir=(0, 1, 0))):
        with Locations(Location((-36.571718637, -38.1, 0), (0, 0, 270))):
            Circle(SKETCH13_R)
    extrude(amount=-CUT_EXTRUDE4_DEPTH, mode=Mode.SUBTRACT)


solid = part.part
